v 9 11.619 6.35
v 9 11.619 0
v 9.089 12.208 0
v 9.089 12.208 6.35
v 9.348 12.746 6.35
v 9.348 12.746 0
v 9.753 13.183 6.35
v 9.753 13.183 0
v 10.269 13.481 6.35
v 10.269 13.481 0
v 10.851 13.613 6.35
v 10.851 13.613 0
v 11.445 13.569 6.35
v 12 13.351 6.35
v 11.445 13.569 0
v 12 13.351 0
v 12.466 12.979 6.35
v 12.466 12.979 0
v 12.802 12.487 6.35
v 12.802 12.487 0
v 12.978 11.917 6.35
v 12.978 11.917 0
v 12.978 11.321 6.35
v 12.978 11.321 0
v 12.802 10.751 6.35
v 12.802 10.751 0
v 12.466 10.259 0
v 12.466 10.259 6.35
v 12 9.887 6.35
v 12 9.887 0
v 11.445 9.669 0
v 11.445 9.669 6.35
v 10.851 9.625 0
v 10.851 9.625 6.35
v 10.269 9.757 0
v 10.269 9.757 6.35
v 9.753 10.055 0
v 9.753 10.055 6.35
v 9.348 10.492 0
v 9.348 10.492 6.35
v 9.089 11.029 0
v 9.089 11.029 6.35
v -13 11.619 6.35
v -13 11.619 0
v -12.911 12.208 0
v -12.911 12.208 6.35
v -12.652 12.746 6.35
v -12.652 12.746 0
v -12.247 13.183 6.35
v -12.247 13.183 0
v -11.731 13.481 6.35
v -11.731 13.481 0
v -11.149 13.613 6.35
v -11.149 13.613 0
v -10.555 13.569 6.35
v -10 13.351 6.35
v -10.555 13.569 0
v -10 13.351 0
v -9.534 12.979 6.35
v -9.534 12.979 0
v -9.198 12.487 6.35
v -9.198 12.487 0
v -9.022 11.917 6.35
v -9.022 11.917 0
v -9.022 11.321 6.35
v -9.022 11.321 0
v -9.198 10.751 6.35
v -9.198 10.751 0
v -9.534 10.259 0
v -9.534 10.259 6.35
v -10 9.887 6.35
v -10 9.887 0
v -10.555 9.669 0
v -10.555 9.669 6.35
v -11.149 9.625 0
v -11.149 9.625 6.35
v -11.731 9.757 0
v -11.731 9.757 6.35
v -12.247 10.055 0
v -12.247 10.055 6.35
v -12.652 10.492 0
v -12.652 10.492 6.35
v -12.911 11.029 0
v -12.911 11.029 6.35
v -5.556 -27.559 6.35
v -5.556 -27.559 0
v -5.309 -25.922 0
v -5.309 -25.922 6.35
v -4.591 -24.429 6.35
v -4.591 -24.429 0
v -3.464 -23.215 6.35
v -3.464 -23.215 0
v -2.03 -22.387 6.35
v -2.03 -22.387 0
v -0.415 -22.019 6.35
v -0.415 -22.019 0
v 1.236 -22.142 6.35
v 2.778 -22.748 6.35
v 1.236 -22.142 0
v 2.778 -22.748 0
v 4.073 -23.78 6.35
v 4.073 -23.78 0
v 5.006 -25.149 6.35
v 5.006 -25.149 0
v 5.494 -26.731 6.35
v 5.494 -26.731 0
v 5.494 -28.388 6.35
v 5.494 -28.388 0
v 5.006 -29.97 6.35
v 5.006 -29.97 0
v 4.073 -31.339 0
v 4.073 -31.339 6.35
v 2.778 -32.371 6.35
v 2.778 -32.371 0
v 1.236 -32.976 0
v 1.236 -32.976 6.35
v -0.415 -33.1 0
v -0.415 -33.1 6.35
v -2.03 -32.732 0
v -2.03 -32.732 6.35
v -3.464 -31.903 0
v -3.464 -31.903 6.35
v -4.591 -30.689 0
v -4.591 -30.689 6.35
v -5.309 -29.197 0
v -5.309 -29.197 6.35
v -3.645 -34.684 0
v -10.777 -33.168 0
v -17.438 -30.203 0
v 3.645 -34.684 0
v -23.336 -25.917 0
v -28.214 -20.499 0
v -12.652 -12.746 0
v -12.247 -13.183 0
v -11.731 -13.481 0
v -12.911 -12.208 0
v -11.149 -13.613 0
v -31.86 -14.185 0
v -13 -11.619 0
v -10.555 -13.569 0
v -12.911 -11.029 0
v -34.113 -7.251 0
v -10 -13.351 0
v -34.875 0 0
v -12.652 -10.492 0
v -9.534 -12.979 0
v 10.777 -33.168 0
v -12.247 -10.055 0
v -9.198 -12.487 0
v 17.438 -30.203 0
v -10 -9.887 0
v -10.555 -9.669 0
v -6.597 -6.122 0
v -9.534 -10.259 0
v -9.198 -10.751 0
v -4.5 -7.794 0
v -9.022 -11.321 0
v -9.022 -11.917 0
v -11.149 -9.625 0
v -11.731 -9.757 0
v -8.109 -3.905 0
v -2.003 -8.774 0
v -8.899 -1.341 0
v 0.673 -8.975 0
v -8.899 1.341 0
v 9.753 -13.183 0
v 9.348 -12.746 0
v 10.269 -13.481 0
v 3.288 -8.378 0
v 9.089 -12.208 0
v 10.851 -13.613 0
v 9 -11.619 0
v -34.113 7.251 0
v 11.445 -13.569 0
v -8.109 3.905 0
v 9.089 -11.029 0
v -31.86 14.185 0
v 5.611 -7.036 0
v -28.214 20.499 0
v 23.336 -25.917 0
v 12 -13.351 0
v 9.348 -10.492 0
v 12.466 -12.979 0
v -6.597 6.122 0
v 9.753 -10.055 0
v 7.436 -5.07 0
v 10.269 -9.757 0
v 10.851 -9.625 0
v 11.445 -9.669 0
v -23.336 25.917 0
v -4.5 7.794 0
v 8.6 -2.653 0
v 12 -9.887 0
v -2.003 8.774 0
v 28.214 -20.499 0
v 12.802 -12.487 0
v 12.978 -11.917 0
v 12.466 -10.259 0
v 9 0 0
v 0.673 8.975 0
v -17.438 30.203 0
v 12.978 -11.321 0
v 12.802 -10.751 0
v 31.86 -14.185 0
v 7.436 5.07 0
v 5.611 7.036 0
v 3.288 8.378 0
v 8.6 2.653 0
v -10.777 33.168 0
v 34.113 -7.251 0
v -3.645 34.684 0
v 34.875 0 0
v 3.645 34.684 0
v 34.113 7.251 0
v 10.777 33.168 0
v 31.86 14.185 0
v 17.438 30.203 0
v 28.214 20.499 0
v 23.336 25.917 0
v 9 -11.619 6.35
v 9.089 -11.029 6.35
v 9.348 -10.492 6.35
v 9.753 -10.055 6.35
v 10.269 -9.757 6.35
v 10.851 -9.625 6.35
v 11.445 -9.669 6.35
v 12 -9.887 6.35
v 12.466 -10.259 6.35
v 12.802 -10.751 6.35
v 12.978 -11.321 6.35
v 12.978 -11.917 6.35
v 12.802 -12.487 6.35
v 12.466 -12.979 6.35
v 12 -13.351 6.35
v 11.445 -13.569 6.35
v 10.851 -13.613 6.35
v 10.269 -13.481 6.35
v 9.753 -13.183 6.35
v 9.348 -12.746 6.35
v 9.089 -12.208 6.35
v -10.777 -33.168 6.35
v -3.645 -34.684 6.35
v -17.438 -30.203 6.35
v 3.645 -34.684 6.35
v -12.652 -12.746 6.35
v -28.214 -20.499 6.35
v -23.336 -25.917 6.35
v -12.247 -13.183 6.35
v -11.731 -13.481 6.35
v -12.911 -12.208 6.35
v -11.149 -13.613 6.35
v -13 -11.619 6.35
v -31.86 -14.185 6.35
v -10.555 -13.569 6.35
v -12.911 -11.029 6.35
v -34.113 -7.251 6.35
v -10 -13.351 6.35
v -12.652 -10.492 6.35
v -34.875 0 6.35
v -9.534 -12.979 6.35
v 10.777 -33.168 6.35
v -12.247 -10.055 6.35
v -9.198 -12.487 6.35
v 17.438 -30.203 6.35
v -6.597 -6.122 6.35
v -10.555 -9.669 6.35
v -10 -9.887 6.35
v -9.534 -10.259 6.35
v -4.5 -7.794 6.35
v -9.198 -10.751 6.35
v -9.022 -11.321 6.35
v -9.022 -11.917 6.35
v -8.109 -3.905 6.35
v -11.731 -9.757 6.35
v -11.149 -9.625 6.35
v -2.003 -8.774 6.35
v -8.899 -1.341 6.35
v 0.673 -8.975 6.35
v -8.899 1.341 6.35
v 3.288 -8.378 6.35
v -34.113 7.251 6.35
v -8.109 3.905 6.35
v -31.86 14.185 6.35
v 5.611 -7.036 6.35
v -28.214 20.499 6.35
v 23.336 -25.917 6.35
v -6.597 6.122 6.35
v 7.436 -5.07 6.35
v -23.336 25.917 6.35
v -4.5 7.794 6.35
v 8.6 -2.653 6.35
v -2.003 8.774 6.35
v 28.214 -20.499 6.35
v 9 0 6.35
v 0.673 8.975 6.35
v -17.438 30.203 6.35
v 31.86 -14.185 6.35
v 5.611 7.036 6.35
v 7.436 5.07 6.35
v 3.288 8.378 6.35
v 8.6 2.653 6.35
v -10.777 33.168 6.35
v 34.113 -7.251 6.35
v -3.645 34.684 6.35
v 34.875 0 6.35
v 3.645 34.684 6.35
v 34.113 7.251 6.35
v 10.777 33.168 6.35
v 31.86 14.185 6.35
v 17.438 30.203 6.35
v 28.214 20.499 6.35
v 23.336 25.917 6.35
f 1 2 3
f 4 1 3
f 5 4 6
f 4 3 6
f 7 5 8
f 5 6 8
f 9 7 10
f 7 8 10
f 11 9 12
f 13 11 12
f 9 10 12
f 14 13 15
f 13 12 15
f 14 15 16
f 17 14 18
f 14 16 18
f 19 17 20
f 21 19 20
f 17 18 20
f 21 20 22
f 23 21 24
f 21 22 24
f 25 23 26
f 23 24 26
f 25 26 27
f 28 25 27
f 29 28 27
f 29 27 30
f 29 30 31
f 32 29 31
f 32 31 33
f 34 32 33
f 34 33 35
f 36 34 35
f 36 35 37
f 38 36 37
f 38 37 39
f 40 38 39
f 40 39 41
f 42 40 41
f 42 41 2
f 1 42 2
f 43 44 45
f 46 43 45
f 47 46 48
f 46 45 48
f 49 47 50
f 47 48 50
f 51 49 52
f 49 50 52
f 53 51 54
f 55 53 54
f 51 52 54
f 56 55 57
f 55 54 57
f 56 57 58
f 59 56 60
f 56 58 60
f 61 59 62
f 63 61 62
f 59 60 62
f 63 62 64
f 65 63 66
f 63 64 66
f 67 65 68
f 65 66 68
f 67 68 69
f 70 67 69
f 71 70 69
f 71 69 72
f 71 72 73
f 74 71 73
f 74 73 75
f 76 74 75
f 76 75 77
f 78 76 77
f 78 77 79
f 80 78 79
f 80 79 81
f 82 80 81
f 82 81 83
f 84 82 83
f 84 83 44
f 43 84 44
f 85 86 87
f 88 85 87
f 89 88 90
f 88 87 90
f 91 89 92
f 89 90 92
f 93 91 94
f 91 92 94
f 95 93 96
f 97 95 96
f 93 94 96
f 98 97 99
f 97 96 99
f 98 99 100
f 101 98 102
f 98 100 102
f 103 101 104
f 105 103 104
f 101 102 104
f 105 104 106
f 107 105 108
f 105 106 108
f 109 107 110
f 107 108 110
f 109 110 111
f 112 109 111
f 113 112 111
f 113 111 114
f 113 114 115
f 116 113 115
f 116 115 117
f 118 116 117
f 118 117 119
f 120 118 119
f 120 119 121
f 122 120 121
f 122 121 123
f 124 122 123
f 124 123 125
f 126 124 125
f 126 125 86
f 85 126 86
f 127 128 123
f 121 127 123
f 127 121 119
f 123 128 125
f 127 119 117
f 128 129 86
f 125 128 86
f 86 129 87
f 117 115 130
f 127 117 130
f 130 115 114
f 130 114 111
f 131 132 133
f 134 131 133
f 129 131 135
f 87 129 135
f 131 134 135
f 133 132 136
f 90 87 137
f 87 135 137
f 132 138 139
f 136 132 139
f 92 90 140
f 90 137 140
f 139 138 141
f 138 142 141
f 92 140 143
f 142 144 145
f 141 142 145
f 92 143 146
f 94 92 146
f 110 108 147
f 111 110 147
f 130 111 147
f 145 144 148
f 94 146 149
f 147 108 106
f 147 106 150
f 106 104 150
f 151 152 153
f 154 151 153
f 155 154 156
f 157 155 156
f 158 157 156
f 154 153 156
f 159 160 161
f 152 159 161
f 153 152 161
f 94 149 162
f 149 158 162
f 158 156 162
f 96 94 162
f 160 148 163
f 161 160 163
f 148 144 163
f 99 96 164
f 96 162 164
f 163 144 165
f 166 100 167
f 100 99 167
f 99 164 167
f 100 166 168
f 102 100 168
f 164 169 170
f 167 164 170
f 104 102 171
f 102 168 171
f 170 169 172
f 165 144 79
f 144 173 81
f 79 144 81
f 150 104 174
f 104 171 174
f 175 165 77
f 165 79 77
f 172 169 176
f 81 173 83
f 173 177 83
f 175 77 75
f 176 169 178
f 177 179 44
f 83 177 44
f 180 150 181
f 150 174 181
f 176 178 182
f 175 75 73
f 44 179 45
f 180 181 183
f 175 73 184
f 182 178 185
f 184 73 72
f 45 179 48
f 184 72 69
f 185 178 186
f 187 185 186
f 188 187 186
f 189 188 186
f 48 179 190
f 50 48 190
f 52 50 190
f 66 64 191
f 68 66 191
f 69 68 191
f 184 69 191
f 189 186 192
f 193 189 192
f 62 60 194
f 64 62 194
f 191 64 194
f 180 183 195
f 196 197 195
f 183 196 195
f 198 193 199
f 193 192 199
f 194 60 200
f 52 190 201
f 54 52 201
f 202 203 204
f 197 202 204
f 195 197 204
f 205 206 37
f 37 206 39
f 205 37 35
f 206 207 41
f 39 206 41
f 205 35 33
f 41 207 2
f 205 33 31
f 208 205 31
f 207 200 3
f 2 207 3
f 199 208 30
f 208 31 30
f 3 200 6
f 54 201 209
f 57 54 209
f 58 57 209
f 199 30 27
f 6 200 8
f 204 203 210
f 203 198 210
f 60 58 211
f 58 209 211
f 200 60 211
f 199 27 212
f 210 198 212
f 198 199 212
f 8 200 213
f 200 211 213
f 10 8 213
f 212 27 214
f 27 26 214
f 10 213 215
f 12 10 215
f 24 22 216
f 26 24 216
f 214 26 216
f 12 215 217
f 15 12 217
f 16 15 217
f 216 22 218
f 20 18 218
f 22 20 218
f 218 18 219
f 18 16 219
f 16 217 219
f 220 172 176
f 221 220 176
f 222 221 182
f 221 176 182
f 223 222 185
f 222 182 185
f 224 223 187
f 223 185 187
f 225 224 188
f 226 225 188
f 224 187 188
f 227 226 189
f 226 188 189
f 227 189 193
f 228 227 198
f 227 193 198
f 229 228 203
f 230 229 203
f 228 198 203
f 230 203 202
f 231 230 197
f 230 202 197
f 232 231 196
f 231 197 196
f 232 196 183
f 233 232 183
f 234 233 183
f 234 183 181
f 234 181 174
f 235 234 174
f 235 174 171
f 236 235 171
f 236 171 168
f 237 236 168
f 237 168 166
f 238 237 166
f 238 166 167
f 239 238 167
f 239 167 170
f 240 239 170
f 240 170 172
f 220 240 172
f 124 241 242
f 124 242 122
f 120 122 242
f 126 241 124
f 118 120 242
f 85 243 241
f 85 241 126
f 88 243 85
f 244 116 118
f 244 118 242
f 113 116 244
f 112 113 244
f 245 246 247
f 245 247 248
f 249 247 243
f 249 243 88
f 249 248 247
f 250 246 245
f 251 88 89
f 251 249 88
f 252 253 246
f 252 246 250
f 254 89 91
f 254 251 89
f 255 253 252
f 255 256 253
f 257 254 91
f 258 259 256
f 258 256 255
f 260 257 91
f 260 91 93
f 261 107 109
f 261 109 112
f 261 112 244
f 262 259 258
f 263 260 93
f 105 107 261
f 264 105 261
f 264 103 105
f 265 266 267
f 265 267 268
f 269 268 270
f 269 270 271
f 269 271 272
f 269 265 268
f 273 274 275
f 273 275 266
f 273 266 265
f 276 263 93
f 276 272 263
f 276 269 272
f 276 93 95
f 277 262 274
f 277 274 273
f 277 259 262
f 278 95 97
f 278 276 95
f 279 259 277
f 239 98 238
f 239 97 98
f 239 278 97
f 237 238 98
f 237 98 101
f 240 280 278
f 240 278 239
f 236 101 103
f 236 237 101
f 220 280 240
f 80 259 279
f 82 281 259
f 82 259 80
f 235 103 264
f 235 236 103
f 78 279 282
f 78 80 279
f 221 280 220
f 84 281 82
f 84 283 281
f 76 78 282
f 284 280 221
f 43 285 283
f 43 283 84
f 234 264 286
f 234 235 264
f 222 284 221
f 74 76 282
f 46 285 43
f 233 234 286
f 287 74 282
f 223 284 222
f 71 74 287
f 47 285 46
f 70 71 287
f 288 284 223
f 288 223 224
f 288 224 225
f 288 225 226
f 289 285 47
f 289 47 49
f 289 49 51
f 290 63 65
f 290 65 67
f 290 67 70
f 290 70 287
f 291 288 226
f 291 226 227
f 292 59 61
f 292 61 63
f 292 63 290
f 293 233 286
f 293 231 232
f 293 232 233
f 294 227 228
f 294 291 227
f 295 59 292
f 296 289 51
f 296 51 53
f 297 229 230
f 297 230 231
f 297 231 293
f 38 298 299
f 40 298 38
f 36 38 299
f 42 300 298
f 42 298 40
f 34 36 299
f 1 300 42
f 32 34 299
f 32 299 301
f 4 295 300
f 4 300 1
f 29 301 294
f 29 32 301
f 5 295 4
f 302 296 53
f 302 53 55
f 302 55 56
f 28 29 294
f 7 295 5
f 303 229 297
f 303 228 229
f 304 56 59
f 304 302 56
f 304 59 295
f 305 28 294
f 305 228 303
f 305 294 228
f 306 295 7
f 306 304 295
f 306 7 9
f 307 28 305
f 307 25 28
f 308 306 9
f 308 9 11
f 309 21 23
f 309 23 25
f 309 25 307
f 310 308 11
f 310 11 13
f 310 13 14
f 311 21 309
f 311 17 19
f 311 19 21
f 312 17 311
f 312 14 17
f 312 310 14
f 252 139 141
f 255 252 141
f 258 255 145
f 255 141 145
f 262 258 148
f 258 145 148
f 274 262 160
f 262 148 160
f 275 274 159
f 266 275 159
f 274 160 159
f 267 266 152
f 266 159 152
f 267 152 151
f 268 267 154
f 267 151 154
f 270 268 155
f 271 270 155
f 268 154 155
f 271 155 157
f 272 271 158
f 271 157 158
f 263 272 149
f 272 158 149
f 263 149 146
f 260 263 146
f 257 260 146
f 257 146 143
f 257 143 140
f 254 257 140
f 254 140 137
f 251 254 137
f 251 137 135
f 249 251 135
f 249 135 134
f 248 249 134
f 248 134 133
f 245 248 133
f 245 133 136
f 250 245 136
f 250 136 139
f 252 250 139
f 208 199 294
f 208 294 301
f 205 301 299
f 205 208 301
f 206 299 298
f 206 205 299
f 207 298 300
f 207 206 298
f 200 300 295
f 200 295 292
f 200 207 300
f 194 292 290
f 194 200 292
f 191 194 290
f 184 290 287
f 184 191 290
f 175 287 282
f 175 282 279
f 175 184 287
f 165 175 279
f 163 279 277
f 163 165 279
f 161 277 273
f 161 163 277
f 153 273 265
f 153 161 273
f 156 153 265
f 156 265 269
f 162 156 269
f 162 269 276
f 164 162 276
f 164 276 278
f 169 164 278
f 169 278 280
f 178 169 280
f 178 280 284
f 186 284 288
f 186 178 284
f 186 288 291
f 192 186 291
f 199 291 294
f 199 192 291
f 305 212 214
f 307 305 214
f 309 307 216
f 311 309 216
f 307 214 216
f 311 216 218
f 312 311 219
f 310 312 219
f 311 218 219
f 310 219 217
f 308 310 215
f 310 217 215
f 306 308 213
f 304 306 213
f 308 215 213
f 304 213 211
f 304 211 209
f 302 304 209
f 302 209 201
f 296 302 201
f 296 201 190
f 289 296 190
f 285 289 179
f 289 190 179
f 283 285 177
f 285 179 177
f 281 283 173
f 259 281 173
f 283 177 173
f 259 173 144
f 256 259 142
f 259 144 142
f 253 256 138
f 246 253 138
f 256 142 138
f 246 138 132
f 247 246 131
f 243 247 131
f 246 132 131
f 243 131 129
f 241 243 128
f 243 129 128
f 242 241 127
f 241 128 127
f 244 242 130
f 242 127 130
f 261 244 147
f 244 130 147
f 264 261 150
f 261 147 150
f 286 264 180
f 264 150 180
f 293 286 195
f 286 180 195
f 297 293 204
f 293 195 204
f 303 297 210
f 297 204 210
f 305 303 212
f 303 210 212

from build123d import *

# Parameters (mm, degrees)
SKETCH1_R           = 34.875
SKETCH1_R_2         = 9
BOSS_EXTRUDE1_DEPTH = 6.35
SKETCH2_R           = 2
CUT_EXTRUDE1_DEPTH  = 7.35
SKETCH3_R           = 5.55625
CUT_EXTRUDE2_DEPTH  = 7.35


with BuildPart() as part:
    # Sketch1 → Boss-Extrude1 (new body)
    with BuildSketch(Plane.XY):
        Circle(SKETCH1_R)
        Circle(SKETCH1_R_2, mode=Mode.SUBTRACT)
    extrude(amount=BOSS_EXTRUDE1_DEPTH)

    # Sketch2 → Cut-Extrude1 (cut, through all)
    with BuildSketch(Plane(origin=(0, 0, 0), x_dir=(-1, 0, 0), z_dir=(0, 0, -1))):
        with Locations((-11, 11.618950039)):
            Circle(SKETCH2_R)
        with Locations((11, 11.618950039)):
            Circle(SKETCH2_R)
        with Locations((11, -11.618950039)):
            Circle(SKETCH2_R)
        with Locations((-11, -11.618950039)):
            Circle(SKETCH2_R)
    extrude(amount=-CUT_EXTRUDE1_DEPTH, mode=Mode.SUBTRACT)

    # Sketch3 → Cut-Extrude2 (cut, through all)
    with BuildSketch(Plane(origin=(0, 0, 0), x_dir=(-1, 0, 0), z_dir=(0, 0, -1))):
        with Locations((0, -27.559440888)):
            Circle(SKETCH3_R)
    extrude(amount=-CUT_EXTRUDE2_DEPTH, mode=Mode.SUBTRACT)


solid = part.part
